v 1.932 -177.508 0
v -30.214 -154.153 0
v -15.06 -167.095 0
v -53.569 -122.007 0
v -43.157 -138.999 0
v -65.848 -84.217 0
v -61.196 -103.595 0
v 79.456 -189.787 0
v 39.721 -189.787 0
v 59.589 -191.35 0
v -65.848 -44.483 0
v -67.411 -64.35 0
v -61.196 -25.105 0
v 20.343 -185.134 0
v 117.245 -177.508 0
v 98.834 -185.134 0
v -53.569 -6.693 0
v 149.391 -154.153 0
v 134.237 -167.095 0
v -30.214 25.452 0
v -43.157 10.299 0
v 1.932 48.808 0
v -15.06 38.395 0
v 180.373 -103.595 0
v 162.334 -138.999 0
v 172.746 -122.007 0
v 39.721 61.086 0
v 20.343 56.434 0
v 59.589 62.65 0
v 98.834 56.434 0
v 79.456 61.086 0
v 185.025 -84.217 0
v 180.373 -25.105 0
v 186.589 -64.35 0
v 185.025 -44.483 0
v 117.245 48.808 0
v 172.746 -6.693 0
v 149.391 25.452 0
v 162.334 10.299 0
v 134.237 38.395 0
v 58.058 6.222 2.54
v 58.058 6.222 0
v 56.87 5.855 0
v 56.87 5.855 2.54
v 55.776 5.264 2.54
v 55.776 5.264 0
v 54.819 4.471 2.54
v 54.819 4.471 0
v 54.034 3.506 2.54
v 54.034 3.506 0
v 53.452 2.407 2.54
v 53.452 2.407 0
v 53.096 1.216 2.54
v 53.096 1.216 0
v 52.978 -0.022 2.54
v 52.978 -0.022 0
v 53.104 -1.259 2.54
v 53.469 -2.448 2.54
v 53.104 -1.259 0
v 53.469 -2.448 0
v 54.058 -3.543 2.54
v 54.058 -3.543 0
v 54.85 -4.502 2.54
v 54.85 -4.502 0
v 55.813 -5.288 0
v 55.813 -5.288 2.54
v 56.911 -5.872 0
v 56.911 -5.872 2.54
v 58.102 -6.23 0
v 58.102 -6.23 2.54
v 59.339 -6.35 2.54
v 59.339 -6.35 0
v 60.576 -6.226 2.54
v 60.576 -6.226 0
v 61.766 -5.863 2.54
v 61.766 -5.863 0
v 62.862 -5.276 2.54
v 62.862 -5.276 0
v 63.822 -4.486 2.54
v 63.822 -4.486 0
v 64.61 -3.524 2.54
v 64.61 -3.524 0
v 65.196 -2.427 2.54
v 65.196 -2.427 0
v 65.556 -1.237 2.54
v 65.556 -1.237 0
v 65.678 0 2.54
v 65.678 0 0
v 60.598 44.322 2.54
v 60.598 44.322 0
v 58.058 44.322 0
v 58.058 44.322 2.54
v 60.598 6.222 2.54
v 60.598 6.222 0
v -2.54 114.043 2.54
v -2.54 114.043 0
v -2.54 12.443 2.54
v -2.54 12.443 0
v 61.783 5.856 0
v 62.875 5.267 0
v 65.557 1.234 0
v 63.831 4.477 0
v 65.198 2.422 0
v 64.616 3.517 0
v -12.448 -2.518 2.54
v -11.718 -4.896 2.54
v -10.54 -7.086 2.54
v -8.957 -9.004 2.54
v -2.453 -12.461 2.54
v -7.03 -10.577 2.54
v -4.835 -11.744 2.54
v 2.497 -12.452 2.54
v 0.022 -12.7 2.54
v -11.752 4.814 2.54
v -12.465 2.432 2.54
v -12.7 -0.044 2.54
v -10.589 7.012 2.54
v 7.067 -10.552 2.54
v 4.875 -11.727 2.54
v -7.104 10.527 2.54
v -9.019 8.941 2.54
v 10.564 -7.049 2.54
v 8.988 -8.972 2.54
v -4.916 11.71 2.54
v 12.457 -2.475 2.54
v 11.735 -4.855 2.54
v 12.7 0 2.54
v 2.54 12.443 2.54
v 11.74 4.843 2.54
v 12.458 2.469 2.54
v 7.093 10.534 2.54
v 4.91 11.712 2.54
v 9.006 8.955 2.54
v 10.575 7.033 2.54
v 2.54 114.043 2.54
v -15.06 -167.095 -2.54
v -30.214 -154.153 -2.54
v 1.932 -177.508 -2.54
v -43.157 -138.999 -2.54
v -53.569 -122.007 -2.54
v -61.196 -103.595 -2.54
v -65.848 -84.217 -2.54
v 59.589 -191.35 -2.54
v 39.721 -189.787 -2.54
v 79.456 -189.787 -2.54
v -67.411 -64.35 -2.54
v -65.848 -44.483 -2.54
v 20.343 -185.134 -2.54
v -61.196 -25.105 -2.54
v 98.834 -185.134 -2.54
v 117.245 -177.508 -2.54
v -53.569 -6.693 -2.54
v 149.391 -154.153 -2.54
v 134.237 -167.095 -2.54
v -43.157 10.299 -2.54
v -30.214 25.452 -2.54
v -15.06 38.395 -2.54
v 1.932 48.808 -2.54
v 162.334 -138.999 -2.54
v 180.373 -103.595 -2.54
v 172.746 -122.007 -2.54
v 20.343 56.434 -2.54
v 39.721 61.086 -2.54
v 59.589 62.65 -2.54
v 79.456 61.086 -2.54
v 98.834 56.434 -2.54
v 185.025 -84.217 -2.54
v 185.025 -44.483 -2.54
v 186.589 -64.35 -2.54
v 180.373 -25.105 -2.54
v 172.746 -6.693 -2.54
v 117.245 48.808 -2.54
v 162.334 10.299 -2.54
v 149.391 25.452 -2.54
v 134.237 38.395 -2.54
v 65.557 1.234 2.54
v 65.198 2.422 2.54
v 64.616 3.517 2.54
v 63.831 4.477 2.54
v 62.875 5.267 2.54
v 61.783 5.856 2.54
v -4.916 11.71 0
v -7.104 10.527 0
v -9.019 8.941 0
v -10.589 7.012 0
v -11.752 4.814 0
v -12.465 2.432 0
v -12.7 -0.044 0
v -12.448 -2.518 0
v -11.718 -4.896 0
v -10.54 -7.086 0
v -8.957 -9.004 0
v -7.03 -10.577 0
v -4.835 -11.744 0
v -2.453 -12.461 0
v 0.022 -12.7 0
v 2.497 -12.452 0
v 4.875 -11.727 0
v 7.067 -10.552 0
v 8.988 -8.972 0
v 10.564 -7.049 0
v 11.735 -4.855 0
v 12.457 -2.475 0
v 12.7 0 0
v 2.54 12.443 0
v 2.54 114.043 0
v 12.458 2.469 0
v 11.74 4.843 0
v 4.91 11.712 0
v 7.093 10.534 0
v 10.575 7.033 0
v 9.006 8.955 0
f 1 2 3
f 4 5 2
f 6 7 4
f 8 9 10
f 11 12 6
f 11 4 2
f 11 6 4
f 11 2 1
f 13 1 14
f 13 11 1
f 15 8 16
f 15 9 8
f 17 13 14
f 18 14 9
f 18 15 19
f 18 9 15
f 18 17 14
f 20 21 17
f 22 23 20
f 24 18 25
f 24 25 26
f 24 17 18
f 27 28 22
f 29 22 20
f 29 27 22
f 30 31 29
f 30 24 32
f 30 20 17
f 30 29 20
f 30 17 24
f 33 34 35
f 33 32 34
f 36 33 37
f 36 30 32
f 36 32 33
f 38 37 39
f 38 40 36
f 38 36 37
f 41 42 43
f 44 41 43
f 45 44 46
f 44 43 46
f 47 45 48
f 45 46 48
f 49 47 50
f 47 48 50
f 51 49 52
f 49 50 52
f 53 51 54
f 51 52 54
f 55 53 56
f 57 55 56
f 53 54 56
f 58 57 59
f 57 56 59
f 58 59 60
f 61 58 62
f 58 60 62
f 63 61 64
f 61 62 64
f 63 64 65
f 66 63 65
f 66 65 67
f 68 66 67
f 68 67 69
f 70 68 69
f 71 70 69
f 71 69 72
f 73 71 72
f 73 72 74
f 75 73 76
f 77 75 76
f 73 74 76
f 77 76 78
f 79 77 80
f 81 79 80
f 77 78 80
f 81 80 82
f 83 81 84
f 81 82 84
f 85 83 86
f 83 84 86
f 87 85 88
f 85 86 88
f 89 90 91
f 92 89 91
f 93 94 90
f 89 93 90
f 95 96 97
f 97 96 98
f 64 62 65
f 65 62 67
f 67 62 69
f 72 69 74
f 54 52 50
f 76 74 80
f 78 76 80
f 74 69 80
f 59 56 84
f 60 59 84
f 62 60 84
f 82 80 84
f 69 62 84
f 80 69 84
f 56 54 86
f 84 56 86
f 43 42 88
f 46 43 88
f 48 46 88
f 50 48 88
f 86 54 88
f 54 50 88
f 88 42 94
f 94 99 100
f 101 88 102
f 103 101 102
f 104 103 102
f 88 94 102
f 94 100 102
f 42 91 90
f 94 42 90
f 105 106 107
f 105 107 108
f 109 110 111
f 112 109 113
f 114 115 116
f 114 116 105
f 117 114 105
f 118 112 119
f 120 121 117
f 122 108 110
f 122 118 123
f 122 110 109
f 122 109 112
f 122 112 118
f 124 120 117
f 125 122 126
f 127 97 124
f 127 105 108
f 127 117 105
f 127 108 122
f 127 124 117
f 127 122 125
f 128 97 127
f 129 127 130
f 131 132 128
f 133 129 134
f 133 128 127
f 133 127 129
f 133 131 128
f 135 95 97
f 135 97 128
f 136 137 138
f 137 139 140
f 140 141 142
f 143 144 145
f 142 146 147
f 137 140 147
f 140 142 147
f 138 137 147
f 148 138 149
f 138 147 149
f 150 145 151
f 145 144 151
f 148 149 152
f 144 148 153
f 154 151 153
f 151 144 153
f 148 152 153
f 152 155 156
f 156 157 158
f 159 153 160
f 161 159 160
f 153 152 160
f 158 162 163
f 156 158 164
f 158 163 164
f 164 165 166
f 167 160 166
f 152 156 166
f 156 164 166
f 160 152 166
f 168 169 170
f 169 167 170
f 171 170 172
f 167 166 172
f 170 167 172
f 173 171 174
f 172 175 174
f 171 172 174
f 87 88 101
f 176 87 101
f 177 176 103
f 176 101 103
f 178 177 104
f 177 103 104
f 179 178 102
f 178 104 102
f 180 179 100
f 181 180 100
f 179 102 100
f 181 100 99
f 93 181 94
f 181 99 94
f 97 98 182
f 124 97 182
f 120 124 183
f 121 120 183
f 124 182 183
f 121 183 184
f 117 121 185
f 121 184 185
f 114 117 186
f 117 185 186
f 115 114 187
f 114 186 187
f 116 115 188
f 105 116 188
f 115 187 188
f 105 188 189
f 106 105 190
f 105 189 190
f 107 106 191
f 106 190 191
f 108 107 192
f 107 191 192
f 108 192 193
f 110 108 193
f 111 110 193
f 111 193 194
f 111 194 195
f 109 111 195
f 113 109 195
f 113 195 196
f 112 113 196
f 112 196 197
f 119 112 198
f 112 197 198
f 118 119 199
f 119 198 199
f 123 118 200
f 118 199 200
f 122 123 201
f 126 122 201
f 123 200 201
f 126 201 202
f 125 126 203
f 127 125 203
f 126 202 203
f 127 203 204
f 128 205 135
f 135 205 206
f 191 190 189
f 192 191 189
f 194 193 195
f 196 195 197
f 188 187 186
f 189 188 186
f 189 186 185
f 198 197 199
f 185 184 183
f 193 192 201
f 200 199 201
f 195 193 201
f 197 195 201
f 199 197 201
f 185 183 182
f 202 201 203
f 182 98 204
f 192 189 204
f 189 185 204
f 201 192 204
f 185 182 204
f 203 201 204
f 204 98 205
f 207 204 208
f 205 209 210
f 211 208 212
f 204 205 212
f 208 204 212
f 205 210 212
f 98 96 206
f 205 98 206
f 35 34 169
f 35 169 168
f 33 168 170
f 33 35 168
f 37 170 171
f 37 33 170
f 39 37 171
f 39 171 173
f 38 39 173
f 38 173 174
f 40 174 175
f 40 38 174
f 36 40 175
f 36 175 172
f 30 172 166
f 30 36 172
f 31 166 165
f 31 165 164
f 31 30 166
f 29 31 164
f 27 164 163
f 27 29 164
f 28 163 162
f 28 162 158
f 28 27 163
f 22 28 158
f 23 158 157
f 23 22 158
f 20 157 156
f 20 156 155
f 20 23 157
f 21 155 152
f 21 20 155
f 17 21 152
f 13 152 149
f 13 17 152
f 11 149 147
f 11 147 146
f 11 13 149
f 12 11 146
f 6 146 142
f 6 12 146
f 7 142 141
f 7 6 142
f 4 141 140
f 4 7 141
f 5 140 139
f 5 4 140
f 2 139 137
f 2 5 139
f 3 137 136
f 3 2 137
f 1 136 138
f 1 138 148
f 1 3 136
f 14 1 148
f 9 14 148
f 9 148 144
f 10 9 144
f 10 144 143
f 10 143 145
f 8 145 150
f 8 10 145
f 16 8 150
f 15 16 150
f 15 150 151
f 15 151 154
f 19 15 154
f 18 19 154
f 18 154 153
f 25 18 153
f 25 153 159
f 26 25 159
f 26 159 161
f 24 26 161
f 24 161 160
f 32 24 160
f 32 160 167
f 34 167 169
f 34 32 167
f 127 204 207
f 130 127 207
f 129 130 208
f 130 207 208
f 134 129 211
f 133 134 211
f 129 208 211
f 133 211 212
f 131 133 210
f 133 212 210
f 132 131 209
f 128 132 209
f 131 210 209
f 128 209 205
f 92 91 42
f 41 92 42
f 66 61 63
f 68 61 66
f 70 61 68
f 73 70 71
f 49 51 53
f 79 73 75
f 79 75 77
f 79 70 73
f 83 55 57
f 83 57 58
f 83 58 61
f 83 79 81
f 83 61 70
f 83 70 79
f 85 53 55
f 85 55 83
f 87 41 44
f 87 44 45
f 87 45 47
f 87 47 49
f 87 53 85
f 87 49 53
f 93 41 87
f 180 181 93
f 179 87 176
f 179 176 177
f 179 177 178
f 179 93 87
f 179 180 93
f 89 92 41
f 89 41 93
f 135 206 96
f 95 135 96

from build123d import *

# Parameters (mm, degrees)
F1_DEPTH = 2.54
F3_DEPTH = 2.54
F4_R     = 127
F5_DEPTH = 2.54


with BuildPart() as f1:
    # F0 (on Top) → F1 (new body)
    with BuildSketch(Plane.XY):
        with BuildLine():
            ThreePointArc((-2.54, 12.443408), (-8.032185, -9.837378), (12.7, 0))
            ThreePointArc((12.7, 0), (9.837378, 8.032185), (2.54, 12.443408))
            ThreePointArc((2.54, 12.443408), (0, 12.7), (-2.54, 12.443408))
        make_face()
        with BuildLine():
            ThreePointArc((-2.54, 12.443408), (0, 12.7), (2.54, 12.443408))
            Line((2.54, 12.443408), (2.54, 114.043408))
            Line((2.54, 114.043408), (0, 114.043408))
            Line((0, 114.043408), (-2.54, 114.043408))
            Line((-2.54, 114.043408), (-2.54, 12.443408))
        make_face()
    extrude(amount=F1_DEPTH)


with BuildPart() as f3:
    # F2 (on Top) → F3 (new body)
    with BuildSketch(Plane.XY):
        with BuildLine():
            ThreePointArc((58.05816, 6.221704), (55.312067, -4.918689), (65.67816, 0))
            ThreePointArc((65.67816, 0), (64.246849, 4.016093), (60.59816, 6.221704))
            ThreePointArc((60.59816, 6.221704), (59.32816, 6.35), (58.05816, 6.221704))
        make_face()
        with BuildLine():
            ThreePointArc((58.05816, 6.221704), (59.32816, 6.35), (60.59816, 6.221704))
            Line((60.59816, 6.221704), (60.59816, 44.321704))
            Line((60.59816, 44.321704), (59.32816, 44.321704))
            Line((59.32816, 44.321704), (58.05816, 44.321704))
            Line((58.05816, 44.321704), (58.05816, 6.221704))
        make_face()
    extrude(amount=F3_DEPTH)


with BuildPart() as f5:
    # F4 (on Top) → F5 (new body)
    with BuildSketch(Plane.XY):
        with Locations((59.588518, -64.350128)):
            Circle(F4_R)
    extrude(amount=-F5_DEPTH)


solid = Compound([f1.part, f3.part, f5.part])
